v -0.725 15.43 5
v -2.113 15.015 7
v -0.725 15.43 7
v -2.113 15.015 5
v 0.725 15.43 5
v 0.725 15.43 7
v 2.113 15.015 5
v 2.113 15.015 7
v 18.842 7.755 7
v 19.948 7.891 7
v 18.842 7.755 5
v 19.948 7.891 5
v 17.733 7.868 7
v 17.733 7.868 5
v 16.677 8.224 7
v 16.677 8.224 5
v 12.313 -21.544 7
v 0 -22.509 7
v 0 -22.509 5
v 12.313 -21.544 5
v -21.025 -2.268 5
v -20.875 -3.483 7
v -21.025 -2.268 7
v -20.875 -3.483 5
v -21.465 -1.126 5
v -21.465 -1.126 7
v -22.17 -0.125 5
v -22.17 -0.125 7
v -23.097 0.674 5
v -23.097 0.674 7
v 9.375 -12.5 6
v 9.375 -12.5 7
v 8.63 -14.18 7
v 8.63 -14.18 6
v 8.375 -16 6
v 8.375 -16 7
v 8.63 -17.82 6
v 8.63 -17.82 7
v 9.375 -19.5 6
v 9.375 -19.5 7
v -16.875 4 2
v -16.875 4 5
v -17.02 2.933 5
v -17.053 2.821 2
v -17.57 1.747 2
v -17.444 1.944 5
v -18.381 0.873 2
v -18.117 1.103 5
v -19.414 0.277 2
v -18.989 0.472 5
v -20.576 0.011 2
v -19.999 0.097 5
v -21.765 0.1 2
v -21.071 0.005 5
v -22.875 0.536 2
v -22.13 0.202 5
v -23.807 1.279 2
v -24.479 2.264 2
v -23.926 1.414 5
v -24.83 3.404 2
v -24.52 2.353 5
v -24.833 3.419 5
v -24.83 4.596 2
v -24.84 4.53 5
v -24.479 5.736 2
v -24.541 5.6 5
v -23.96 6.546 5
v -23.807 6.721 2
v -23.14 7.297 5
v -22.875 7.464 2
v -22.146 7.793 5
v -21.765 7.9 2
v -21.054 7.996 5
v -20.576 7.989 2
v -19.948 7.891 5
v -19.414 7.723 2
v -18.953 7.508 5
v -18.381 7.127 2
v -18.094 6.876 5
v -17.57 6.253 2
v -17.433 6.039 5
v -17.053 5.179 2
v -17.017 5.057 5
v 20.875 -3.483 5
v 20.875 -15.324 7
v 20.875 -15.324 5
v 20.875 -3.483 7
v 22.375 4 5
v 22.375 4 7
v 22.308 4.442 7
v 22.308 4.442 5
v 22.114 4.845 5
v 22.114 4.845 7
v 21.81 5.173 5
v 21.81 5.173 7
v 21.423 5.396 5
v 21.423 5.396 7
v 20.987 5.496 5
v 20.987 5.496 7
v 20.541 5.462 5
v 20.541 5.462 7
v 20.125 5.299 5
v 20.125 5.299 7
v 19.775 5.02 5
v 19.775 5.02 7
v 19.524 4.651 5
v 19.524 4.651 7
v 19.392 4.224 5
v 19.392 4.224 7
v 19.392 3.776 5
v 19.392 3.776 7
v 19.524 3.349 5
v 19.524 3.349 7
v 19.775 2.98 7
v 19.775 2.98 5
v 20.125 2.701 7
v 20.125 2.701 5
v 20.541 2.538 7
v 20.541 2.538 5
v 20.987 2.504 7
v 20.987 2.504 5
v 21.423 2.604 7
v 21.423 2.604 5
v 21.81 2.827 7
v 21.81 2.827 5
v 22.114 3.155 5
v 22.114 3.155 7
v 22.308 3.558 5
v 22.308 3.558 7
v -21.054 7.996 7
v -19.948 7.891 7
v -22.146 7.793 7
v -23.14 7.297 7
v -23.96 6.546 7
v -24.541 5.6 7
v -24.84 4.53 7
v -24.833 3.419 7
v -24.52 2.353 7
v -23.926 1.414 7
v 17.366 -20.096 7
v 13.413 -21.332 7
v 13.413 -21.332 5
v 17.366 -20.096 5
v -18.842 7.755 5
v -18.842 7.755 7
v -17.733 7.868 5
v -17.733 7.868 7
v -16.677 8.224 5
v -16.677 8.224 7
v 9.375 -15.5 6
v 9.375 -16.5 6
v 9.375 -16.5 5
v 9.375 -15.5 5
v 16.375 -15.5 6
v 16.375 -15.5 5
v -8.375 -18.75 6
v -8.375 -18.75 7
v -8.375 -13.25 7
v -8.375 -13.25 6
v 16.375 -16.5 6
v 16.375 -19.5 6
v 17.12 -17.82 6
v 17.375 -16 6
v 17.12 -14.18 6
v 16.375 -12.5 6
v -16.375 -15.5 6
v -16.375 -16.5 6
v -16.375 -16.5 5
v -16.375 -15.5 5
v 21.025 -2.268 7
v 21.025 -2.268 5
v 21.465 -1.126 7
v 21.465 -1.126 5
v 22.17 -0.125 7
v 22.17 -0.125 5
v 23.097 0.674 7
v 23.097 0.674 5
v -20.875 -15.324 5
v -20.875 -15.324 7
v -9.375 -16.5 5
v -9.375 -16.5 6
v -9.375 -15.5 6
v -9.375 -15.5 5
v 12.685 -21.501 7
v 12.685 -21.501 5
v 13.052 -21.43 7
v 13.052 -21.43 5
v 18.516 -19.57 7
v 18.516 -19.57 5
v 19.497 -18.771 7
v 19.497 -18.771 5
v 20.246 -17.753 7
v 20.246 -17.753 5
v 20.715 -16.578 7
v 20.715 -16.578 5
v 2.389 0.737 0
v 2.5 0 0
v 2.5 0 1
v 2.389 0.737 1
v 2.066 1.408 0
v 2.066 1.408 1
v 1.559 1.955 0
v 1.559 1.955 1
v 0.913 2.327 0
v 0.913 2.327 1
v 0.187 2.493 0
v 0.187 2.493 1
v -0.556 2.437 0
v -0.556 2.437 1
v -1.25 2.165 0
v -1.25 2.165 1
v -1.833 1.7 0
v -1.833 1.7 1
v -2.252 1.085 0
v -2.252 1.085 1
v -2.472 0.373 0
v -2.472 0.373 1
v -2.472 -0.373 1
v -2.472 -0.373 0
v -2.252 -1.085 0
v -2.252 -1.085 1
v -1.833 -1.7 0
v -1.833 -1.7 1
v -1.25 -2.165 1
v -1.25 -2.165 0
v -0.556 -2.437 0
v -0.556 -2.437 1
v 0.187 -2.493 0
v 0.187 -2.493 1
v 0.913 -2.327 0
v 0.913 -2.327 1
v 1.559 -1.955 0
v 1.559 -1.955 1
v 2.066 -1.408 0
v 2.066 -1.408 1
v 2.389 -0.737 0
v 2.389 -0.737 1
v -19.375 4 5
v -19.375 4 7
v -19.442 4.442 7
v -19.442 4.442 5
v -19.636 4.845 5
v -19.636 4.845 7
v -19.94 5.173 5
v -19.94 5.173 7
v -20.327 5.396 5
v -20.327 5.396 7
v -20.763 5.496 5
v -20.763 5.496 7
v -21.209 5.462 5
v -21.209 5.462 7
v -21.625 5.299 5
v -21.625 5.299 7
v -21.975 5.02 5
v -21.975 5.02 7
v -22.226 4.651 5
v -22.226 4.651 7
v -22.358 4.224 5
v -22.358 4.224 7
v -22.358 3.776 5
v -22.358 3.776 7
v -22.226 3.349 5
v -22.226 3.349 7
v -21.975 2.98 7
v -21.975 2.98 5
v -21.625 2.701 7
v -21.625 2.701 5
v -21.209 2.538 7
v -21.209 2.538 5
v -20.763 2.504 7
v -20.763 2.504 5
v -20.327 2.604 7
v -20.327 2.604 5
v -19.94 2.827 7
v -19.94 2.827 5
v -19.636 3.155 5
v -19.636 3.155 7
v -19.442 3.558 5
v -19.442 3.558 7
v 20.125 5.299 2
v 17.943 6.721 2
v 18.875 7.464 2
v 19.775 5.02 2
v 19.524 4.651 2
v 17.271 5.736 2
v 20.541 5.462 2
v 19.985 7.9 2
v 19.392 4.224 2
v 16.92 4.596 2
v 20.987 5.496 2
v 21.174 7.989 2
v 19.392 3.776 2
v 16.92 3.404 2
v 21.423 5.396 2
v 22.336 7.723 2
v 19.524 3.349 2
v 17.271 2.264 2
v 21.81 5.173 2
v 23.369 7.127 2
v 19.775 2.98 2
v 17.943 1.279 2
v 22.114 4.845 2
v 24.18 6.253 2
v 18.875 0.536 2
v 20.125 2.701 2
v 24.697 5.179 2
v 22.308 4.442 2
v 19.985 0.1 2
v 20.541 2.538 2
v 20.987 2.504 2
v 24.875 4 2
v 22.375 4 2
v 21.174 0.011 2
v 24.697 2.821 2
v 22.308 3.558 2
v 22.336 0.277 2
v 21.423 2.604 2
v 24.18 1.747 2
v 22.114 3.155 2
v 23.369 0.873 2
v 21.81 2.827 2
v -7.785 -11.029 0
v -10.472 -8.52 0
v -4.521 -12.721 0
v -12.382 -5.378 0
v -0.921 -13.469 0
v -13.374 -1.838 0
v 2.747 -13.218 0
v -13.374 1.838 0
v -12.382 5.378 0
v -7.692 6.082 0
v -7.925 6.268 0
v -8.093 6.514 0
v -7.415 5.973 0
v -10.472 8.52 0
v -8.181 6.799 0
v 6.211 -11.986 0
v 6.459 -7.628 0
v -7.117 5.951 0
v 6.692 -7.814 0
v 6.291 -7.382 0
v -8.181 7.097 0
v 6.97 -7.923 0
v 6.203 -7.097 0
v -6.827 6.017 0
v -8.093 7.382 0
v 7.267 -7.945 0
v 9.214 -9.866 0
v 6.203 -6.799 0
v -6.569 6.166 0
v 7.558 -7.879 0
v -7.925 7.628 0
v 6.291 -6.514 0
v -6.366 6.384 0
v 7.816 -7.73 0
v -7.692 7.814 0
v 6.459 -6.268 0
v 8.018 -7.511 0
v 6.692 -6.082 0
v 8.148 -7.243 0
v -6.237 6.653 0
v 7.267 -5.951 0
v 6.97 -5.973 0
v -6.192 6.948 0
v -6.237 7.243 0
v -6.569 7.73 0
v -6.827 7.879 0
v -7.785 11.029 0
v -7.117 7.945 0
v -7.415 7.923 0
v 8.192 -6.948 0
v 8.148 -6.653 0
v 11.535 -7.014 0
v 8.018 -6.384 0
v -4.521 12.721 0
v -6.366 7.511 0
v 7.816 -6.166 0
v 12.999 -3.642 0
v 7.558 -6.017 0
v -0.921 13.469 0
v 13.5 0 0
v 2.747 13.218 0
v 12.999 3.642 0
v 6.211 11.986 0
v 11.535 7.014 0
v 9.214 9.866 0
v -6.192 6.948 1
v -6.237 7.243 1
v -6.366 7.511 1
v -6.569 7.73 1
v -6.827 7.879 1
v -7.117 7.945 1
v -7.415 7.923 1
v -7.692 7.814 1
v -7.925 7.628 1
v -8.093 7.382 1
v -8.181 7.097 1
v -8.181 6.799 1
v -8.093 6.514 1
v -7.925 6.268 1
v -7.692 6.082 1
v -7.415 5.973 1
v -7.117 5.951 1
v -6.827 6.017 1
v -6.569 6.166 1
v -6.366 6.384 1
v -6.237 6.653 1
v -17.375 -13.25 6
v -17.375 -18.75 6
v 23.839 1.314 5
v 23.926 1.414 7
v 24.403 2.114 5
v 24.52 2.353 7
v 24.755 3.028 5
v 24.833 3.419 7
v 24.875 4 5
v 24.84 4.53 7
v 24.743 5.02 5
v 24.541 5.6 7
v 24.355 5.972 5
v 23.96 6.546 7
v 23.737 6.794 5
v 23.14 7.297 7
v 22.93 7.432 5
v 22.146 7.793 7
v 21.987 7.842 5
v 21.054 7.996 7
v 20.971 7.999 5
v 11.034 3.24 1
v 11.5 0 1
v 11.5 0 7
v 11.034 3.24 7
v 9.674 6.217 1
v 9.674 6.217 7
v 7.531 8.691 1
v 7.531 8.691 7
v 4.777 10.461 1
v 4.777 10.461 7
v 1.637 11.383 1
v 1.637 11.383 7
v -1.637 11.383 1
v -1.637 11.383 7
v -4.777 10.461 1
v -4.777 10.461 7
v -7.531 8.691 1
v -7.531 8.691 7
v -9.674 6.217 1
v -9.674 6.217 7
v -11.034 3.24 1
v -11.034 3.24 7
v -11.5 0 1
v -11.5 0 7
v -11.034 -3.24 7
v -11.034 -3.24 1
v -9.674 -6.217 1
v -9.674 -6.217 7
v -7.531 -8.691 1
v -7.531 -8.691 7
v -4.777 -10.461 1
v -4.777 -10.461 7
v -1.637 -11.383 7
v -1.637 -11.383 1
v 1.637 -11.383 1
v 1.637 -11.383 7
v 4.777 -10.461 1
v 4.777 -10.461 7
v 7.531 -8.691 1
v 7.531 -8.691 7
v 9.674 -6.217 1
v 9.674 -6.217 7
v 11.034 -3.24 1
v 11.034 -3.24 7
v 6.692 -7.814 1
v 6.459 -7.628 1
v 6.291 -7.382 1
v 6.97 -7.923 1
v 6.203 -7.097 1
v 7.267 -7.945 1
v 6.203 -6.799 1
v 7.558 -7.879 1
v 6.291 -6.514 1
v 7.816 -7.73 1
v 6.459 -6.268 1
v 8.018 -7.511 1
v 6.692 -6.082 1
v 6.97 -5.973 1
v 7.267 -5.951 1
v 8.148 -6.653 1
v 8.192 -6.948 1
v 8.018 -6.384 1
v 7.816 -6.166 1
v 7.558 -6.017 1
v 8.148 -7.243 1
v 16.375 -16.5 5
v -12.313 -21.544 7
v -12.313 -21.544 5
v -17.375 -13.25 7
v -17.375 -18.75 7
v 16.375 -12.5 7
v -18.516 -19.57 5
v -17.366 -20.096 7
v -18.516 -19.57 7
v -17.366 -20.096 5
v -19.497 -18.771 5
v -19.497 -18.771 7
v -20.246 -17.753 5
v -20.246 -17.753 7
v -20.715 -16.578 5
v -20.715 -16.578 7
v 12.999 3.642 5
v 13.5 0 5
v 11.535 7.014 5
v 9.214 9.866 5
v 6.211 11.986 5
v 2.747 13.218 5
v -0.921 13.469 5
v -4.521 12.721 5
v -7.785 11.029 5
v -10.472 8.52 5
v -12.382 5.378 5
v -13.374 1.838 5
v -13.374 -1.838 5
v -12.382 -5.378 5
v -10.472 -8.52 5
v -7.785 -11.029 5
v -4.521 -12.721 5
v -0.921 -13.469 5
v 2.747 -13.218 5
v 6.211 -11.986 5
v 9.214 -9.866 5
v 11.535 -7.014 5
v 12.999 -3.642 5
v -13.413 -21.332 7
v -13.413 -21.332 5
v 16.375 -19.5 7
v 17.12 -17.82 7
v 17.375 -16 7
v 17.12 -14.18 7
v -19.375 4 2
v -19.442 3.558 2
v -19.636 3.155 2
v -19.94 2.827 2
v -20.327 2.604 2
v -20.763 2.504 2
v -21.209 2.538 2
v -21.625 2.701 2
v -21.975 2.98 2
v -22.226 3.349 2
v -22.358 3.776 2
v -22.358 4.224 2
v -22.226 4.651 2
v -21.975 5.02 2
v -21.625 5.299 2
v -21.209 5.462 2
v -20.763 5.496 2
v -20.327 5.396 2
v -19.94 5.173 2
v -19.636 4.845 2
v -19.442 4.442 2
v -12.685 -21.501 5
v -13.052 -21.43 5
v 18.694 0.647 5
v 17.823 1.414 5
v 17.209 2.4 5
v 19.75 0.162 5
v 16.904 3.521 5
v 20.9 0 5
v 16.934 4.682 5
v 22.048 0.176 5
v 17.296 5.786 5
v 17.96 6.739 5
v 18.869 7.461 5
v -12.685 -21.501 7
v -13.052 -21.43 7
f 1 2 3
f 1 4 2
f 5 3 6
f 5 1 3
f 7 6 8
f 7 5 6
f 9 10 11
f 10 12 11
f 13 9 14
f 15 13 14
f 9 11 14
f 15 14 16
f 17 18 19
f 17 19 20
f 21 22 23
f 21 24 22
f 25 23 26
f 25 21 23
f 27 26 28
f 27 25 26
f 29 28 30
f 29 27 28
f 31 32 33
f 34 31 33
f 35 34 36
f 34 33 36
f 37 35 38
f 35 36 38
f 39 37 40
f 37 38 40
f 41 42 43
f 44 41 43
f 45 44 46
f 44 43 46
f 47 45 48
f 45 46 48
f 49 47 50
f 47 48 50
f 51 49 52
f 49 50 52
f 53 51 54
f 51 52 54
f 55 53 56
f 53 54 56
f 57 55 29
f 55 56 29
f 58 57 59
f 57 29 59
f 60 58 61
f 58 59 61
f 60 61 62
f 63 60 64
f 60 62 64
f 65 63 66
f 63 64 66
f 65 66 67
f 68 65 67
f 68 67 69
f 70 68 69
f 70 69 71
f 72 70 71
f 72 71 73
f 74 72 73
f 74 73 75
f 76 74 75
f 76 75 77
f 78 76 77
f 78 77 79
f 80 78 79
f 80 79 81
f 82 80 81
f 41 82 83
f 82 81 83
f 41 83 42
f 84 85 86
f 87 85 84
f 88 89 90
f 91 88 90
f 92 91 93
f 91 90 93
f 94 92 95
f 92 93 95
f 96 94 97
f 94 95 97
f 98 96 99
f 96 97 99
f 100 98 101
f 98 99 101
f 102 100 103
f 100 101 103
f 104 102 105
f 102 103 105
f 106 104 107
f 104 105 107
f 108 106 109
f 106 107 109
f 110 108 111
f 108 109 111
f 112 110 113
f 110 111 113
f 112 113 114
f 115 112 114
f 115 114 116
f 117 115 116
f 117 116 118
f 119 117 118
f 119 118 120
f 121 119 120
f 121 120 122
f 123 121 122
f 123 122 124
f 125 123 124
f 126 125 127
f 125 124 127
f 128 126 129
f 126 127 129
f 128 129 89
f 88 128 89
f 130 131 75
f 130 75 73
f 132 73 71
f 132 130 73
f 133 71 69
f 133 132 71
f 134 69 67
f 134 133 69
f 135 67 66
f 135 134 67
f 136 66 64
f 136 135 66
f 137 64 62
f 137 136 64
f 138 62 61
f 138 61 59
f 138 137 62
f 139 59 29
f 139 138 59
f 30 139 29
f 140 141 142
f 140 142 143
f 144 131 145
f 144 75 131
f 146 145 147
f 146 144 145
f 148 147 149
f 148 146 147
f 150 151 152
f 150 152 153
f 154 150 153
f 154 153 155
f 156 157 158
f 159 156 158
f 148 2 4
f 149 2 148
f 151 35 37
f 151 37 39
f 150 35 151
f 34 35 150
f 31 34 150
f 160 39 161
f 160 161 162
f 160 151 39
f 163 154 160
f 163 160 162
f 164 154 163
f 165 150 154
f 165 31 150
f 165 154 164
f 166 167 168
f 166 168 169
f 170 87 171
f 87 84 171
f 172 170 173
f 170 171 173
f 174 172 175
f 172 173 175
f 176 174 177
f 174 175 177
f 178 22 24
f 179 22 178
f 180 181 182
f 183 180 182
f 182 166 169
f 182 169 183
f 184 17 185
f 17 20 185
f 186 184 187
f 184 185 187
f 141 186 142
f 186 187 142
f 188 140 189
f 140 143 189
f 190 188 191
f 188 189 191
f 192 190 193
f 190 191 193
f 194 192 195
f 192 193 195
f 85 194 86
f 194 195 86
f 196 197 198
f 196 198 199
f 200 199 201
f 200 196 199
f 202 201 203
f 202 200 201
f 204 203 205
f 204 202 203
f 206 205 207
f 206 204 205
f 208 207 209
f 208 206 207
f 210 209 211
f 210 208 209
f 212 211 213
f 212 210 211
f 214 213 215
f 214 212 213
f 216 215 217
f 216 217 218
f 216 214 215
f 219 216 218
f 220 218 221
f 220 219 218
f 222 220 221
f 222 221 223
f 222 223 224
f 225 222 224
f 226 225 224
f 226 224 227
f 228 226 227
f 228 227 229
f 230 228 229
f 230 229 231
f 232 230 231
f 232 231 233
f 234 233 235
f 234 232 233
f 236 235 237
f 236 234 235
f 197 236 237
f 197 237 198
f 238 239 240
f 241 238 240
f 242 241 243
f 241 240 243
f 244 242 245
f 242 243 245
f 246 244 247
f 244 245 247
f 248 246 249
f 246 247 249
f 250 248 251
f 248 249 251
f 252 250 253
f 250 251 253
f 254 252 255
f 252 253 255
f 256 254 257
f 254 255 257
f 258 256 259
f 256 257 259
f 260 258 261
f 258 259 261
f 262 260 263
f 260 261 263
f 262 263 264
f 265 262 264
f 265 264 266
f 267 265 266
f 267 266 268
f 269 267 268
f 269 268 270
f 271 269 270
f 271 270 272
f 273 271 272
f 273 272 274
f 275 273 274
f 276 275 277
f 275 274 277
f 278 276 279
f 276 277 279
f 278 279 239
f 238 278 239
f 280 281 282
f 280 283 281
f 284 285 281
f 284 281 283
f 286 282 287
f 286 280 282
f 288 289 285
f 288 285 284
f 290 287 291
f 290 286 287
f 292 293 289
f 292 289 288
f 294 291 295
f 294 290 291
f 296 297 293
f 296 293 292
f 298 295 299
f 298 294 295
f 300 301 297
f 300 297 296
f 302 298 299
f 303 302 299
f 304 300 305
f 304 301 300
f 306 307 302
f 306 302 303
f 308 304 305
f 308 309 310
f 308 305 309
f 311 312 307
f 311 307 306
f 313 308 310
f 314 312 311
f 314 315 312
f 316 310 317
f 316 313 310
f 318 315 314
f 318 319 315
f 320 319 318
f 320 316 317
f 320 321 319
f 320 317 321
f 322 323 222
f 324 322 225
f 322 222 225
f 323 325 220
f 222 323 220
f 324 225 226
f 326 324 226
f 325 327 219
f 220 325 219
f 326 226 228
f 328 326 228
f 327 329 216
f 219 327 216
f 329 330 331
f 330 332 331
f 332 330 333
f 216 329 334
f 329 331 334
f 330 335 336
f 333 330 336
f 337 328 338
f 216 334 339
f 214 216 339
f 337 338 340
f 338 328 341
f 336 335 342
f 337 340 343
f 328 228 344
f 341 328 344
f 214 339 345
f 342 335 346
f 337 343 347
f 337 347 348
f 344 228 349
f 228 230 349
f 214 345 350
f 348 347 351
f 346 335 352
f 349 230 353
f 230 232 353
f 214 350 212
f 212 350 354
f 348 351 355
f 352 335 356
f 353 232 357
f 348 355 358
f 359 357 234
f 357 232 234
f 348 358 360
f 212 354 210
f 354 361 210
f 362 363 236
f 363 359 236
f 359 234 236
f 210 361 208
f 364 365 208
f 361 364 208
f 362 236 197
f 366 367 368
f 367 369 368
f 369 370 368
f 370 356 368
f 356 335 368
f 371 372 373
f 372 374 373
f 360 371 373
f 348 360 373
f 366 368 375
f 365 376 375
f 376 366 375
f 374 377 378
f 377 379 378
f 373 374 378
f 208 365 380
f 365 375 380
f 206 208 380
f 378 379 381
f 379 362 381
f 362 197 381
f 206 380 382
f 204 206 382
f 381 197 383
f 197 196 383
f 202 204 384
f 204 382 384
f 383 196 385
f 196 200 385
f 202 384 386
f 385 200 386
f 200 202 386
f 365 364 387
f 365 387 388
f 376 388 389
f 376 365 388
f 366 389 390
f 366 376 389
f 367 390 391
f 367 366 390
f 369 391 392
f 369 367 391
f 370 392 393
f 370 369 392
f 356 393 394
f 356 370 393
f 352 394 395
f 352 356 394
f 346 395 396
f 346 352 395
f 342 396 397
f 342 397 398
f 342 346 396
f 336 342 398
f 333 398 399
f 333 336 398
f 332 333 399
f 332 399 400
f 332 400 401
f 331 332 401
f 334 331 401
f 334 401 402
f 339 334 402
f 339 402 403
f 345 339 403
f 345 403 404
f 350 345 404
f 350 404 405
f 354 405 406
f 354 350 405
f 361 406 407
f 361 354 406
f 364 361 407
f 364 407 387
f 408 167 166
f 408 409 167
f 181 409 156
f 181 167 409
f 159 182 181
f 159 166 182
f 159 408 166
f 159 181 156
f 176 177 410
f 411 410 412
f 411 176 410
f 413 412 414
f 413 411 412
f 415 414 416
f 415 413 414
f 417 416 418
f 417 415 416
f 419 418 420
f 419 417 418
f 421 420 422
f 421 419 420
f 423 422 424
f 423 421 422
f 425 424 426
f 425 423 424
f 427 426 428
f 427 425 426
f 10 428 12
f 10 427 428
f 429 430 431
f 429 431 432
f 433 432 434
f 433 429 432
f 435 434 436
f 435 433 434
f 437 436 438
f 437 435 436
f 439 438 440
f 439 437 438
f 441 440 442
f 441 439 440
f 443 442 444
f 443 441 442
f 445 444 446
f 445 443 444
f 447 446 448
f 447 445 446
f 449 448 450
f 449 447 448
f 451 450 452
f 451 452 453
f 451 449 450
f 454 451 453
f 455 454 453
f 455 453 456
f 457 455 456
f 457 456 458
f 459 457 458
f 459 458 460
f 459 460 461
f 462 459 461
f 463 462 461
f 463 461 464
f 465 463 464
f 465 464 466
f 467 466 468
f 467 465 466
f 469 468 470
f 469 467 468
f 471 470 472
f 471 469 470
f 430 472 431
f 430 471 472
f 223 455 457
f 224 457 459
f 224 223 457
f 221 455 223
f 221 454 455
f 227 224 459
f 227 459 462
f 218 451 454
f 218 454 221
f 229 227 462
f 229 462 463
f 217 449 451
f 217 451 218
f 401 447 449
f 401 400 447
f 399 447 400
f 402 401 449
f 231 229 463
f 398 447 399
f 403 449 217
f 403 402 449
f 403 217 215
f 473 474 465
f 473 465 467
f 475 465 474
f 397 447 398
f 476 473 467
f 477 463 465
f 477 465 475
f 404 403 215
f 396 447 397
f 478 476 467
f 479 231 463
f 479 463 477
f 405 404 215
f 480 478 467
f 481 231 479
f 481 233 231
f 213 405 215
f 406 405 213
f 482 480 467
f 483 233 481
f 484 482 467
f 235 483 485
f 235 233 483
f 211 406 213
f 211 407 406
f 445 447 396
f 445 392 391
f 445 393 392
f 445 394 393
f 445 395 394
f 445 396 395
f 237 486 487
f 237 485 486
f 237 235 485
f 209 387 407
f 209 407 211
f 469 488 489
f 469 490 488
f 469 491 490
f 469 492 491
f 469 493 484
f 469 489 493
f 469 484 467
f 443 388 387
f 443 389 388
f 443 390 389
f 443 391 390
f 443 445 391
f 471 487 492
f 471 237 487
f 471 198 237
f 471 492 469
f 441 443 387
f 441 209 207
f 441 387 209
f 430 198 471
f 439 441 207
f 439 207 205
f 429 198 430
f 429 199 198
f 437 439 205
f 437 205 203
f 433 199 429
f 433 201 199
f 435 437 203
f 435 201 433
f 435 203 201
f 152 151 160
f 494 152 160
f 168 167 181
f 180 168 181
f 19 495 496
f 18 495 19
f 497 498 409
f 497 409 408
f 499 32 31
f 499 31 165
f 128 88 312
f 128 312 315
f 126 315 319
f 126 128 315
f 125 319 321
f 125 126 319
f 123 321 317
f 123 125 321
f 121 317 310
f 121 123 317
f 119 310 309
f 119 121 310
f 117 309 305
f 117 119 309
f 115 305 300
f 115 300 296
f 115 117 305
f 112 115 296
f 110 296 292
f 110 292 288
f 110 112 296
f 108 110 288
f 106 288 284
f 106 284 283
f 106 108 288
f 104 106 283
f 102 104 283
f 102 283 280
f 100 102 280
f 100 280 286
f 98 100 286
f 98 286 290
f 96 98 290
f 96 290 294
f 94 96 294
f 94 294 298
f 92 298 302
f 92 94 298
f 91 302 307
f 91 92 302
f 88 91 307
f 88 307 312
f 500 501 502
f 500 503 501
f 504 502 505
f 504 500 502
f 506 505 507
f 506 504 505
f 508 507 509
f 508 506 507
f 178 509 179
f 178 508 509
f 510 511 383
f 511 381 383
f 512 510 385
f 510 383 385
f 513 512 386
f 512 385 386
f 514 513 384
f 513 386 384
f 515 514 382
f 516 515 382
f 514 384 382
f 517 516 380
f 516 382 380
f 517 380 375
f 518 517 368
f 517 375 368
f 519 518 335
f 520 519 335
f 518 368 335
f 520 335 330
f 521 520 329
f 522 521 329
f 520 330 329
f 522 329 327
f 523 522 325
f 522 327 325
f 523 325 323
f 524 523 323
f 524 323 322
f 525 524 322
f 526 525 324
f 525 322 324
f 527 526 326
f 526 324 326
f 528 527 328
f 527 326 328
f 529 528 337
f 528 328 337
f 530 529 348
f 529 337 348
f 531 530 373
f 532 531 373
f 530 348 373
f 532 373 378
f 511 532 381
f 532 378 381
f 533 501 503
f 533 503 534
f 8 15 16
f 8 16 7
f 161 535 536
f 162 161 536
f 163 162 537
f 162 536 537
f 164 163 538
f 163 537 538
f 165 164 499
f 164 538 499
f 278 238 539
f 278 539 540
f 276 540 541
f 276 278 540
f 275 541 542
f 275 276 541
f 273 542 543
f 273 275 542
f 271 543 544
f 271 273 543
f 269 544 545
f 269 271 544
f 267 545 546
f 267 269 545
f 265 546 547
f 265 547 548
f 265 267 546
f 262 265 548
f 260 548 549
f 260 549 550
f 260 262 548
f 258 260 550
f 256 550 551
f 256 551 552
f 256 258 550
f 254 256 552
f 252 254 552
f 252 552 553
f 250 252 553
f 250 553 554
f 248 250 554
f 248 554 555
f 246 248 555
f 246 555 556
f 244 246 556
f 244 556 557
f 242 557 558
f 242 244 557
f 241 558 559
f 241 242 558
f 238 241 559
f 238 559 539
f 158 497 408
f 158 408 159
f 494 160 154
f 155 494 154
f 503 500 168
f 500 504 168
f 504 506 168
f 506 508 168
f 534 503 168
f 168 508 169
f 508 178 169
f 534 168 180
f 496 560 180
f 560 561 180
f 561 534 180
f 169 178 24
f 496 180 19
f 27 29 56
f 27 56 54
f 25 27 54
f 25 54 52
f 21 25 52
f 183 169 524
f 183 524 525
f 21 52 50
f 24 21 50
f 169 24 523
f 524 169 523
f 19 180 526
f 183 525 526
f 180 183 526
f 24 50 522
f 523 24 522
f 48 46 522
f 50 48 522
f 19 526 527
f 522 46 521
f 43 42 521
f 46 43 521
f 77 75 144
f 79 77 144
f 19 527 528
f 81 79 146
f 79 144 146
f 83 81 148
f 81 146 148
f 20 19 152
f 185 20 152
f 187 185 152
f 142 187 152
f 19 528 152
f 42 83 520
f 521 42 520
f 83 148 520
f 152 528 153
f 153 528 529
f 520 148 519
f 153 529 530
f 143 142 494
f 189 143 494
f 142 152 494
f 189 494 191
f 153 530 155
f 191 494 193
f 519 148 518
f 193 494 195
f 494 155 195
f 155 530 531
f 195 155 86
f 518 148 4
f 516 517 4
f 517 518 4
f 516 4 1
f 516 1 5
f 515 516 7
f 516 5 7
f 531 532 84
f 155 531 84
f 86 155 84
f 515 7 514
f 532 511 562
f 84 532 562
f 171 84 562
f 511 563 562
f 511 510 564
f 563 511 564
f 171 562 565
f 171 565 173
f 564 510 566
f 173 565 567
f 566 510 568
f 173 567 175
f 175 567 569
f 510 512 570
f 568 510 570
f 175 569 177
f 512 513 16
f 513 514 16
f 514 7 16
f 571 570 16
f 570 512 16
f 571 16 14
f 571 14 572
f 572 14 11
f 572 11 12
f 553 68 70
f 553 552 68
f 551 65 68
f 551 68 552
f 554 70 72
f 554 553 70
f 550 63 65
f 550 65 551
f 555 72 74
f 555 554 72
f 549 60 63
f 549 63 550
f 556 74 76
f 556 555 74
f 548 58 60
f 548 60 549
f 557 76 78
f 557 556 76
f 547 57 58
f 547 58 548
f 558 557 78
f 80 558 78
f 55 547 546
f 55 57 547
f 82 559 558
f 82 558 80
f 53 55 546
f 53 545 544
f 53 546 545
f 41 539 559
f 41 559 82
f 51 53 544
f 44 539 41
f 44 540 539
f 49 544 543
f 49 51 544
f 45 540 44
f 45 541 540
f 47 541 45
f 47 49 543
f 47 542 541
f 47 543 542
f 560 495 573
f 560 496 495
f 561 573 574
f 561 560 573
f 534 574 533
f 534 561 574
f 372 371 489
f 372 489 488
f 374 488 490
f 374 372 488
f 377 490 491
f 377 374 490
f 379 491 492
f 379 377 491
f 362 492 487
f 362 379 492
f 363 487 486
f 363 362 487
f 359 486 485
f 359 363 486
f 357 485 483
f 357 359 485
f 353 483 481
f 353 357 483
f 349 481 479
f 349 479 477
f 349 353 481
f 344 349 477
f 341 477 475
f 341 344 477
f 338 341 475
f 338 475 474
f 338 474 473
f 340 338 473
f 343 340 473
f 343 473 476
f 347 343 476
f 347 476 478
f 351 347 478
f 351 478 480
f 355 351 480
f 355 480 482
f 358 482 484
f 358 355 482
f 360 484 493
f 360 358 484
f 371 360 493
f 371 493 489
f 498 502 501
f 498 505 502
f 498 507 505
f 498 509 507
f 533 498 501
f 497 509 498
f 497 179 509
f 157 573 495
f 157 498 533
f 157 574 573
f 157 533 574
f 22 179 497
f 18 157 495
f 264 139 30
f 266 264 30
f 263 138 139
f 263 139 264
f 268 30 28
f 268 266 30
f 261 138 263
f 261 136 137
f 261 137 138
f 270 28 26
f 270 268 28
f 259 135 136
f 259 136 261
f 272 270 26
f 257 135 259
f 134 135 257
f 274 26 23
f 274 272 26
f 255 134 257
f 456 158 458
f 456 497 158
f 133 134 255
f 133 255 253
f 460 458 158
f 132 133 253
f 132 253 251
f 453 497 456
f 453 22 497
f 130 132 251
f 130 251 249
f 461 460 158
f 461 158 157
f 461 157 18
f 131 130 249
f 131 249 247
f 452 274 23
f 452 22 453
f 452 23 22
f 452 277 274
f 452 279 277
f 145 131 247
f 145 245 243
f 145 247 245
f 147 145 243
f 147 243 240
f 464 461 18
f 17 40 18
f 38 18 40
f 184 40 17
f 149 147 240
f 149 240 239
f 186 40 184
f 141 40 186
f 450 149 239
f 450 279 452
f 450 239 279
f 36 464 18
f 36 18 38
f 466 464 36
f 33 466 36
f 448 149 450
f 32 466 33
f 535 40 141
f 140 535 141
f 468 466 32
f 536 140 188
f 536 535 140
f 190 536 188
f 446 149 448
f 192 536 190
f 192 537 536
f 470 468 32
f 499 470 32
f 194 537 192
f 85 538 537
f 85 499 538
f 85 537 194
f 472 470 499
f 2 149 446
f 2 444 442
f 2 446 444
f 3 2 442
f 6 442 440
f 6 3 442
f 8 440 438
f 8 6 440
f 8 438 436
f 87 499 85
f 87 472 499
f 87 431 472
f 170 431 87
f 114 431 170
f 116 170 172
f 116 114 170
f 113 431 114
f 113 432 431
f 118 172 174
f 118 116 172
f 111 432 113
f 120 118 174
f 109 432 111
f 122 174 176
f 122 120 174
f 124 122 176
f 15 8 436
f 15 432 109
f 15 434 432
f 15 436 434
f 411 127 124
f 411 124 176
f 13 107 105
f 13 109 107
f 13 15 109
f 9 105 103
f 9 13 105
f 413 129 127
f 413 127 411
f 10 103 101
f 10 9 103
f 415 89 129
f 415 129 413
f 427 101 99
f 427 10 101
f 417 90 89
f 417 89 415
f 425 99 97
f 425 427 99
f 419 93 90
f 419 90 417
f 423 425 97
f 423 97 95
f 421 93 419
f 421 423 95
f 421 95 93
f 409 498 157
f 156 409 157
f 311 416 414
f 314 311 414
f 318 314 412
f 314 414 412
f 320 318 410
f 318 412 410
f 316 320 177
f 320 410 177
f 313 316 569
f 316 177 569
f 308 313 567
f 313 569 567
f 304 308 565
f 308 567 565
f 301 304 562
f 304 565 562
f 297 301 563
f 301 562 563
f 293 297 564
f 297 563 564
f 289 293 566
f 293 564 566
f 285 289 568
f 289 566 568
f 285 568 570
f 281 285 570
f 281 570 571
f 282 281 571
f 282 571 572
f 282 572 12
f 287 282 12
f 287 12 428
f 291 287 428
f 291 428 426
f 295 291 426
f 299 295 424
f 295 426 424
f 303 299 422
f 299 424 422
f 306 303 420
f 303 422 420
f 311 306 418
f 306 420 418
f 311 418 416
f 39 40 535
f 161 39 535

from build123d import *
from build123d import SkipClean  # not in build123d's __all__

# Parameters (mm, degrees)
F0_R      = 13.5
F0_R_2    = 1
F0_R_3    = 2.5
F1_DEPTH  = 1
F2_R      = 13.5
F2_R_2    = 11.5
F3_DEPTH  = 6
F4_W      = 7
F4_H      = 1
F4_R      = 1.5
F4_R_2    = 13.5
F5_DEPTH  = 2
F6_R      = 5
F7_W      = 7
F7_H      = 7
F7_W_2    = 9
F7_H_2    = 5.5
F8_DEPTH  = 1
F9_R      = 4
F9_R_2    = 1.5
F10_DEPTH = 3


with BuildPart() as f1:
    # F0 (on Top) → F1 (new body)
    with BuildSketch(Plane.XY):
        Circle(F0_R)
        with Locations((7.1922094223, -6.9478143056)):
            Circle(F0_R_2, mode=Mode.SUBTRACT)
        with Locations((-7.1922094223, 6.9478143056)):
            Circle(F0_R_2, mode=Mode.SUBTRACT)
        Circle(F0_R_3, mode=Mode.SUBTRACT)
    extrude(amount=F1_DEPTH)

    # F2 (on face) → F3 (join)
    with BuildSketch(Plane.XY.offset(1)):
        Circle(F2_R)
        Circle(F2_R_2, mode=Mode.SUBTRACT)
    extrude(amount=F3_DEPTH)

    # F4 (on face) → F5 (join)
    with BuildSketch(Plane.XY.offset(7)):
        with BuildLine():
            Line((-12.875, -21.5), (0, -22.5089902885))
            Line((0, -22.5089902885), (12.875, -21.5))
            Line((12.875, -21.5), (20.875, -19))
            Line((20.875, -19), (20.875, 0))
            ThreePointArc((20.875, 0), (24.6990897298, 5.1731742149), (18.6318382667, 7.3118311307))
            Line((18.6318382667, 7.3118311307), (0, 16))
            Line((0, 16), (-18.6318382667, 7.3118311307))
            ThreePointArc((-18.6318382667, 7.3118311307), (-24.6990897298, 5.1731742149), (-20.875, 0))
            Line((-20.875, 0), (-20.875, -19))
            Line((-20.875, -19), (-12.875, -21.5))
        make_face()
        with Locations((-12.875, -16)):
            Rectangle(F4_W, F4_H, mode=Mode.SUBTRACT)
        with Locations((12.875, -16)):
            Rectangle(F4_W, F4_H, mode=Mode.SUBTRACT)
        with Locations((-20.875, 4)):
            Circle(F4_R, mode=Mode.SUBTRACT)
        Circle(F4_R_2, mode=Mode.SUBTRACT)
        with Locations((20.875, 4)):
            Circle(F4_R, mode=Mode.SUBTRACT)
    extrude(amount=-F5_DEPTH)

    # F6
    f6_edges = [f1.edges().sort_by_distance(p)[0] for p in [
        (0, 16, 6),
        (20.875, -19, 6),
        (12.875, -21.5, 6),
        (-12.875, -21.5, 6),
        (-20.875, -19, 6),
        (-20.875, 0, 6),
        (-18.631838, 7.311831, 6),
        (18.631838, 7.311831, 6),
        (20.875, 0, 6),
    ]]
    fillet(f6_edges, radius=F6_R)

    # F7 (on face) → F8 (cut)
    with BuildSketch(Plane.XY.offset(7)):
        with Locations((12.875, -16)):
            Rectangle(F7_W, F7_H)
        with BuildLine():
            ThreePointArc((16.375, -19.5), (17.375, -16), (16.375, -12.5))
            Line((16.375, -12.5), (16.375, -19.5))
        make_face()
        with BuildLine():
            Line((9.375, -19.5), (9.375, -12.5))
            ThreePointArc((9.375, -12.5), (8.375, -16), (9.375, -19.5))
        make_face()
        with Locations((-12.875, -16)):
            Rectangle(F7_W_2, F7_H_2)
    extrude(amount=-F8_DEPTH, mode=Mode.SUBTRACT)

    # F9 (on face) → F10 (join)
    with BuildSketch(Plane(origin=(0, 0, 5), x_dir=(1, 0, 0), z_dir=(0, 0, -1))):
        with Locations((20.875, -4)):
            Circle(F9_R)
        with Locations((20.875, -4)):
            Circle(F9_R_2, mode=Mode.SUBTRACT)
        with Locations((-20.875, -4)):
            Circle(F9_R)
        with Locations((-20.875, -4)):
            Circle(F9_R_2, mode=Mode.SUBTRACT)
    with SkipClean():  # cleaning this boolean's faces spoils the solid; the shape is the same uncleaned
        extrude(amount=F10_DEPTH)


solid = f1.part
